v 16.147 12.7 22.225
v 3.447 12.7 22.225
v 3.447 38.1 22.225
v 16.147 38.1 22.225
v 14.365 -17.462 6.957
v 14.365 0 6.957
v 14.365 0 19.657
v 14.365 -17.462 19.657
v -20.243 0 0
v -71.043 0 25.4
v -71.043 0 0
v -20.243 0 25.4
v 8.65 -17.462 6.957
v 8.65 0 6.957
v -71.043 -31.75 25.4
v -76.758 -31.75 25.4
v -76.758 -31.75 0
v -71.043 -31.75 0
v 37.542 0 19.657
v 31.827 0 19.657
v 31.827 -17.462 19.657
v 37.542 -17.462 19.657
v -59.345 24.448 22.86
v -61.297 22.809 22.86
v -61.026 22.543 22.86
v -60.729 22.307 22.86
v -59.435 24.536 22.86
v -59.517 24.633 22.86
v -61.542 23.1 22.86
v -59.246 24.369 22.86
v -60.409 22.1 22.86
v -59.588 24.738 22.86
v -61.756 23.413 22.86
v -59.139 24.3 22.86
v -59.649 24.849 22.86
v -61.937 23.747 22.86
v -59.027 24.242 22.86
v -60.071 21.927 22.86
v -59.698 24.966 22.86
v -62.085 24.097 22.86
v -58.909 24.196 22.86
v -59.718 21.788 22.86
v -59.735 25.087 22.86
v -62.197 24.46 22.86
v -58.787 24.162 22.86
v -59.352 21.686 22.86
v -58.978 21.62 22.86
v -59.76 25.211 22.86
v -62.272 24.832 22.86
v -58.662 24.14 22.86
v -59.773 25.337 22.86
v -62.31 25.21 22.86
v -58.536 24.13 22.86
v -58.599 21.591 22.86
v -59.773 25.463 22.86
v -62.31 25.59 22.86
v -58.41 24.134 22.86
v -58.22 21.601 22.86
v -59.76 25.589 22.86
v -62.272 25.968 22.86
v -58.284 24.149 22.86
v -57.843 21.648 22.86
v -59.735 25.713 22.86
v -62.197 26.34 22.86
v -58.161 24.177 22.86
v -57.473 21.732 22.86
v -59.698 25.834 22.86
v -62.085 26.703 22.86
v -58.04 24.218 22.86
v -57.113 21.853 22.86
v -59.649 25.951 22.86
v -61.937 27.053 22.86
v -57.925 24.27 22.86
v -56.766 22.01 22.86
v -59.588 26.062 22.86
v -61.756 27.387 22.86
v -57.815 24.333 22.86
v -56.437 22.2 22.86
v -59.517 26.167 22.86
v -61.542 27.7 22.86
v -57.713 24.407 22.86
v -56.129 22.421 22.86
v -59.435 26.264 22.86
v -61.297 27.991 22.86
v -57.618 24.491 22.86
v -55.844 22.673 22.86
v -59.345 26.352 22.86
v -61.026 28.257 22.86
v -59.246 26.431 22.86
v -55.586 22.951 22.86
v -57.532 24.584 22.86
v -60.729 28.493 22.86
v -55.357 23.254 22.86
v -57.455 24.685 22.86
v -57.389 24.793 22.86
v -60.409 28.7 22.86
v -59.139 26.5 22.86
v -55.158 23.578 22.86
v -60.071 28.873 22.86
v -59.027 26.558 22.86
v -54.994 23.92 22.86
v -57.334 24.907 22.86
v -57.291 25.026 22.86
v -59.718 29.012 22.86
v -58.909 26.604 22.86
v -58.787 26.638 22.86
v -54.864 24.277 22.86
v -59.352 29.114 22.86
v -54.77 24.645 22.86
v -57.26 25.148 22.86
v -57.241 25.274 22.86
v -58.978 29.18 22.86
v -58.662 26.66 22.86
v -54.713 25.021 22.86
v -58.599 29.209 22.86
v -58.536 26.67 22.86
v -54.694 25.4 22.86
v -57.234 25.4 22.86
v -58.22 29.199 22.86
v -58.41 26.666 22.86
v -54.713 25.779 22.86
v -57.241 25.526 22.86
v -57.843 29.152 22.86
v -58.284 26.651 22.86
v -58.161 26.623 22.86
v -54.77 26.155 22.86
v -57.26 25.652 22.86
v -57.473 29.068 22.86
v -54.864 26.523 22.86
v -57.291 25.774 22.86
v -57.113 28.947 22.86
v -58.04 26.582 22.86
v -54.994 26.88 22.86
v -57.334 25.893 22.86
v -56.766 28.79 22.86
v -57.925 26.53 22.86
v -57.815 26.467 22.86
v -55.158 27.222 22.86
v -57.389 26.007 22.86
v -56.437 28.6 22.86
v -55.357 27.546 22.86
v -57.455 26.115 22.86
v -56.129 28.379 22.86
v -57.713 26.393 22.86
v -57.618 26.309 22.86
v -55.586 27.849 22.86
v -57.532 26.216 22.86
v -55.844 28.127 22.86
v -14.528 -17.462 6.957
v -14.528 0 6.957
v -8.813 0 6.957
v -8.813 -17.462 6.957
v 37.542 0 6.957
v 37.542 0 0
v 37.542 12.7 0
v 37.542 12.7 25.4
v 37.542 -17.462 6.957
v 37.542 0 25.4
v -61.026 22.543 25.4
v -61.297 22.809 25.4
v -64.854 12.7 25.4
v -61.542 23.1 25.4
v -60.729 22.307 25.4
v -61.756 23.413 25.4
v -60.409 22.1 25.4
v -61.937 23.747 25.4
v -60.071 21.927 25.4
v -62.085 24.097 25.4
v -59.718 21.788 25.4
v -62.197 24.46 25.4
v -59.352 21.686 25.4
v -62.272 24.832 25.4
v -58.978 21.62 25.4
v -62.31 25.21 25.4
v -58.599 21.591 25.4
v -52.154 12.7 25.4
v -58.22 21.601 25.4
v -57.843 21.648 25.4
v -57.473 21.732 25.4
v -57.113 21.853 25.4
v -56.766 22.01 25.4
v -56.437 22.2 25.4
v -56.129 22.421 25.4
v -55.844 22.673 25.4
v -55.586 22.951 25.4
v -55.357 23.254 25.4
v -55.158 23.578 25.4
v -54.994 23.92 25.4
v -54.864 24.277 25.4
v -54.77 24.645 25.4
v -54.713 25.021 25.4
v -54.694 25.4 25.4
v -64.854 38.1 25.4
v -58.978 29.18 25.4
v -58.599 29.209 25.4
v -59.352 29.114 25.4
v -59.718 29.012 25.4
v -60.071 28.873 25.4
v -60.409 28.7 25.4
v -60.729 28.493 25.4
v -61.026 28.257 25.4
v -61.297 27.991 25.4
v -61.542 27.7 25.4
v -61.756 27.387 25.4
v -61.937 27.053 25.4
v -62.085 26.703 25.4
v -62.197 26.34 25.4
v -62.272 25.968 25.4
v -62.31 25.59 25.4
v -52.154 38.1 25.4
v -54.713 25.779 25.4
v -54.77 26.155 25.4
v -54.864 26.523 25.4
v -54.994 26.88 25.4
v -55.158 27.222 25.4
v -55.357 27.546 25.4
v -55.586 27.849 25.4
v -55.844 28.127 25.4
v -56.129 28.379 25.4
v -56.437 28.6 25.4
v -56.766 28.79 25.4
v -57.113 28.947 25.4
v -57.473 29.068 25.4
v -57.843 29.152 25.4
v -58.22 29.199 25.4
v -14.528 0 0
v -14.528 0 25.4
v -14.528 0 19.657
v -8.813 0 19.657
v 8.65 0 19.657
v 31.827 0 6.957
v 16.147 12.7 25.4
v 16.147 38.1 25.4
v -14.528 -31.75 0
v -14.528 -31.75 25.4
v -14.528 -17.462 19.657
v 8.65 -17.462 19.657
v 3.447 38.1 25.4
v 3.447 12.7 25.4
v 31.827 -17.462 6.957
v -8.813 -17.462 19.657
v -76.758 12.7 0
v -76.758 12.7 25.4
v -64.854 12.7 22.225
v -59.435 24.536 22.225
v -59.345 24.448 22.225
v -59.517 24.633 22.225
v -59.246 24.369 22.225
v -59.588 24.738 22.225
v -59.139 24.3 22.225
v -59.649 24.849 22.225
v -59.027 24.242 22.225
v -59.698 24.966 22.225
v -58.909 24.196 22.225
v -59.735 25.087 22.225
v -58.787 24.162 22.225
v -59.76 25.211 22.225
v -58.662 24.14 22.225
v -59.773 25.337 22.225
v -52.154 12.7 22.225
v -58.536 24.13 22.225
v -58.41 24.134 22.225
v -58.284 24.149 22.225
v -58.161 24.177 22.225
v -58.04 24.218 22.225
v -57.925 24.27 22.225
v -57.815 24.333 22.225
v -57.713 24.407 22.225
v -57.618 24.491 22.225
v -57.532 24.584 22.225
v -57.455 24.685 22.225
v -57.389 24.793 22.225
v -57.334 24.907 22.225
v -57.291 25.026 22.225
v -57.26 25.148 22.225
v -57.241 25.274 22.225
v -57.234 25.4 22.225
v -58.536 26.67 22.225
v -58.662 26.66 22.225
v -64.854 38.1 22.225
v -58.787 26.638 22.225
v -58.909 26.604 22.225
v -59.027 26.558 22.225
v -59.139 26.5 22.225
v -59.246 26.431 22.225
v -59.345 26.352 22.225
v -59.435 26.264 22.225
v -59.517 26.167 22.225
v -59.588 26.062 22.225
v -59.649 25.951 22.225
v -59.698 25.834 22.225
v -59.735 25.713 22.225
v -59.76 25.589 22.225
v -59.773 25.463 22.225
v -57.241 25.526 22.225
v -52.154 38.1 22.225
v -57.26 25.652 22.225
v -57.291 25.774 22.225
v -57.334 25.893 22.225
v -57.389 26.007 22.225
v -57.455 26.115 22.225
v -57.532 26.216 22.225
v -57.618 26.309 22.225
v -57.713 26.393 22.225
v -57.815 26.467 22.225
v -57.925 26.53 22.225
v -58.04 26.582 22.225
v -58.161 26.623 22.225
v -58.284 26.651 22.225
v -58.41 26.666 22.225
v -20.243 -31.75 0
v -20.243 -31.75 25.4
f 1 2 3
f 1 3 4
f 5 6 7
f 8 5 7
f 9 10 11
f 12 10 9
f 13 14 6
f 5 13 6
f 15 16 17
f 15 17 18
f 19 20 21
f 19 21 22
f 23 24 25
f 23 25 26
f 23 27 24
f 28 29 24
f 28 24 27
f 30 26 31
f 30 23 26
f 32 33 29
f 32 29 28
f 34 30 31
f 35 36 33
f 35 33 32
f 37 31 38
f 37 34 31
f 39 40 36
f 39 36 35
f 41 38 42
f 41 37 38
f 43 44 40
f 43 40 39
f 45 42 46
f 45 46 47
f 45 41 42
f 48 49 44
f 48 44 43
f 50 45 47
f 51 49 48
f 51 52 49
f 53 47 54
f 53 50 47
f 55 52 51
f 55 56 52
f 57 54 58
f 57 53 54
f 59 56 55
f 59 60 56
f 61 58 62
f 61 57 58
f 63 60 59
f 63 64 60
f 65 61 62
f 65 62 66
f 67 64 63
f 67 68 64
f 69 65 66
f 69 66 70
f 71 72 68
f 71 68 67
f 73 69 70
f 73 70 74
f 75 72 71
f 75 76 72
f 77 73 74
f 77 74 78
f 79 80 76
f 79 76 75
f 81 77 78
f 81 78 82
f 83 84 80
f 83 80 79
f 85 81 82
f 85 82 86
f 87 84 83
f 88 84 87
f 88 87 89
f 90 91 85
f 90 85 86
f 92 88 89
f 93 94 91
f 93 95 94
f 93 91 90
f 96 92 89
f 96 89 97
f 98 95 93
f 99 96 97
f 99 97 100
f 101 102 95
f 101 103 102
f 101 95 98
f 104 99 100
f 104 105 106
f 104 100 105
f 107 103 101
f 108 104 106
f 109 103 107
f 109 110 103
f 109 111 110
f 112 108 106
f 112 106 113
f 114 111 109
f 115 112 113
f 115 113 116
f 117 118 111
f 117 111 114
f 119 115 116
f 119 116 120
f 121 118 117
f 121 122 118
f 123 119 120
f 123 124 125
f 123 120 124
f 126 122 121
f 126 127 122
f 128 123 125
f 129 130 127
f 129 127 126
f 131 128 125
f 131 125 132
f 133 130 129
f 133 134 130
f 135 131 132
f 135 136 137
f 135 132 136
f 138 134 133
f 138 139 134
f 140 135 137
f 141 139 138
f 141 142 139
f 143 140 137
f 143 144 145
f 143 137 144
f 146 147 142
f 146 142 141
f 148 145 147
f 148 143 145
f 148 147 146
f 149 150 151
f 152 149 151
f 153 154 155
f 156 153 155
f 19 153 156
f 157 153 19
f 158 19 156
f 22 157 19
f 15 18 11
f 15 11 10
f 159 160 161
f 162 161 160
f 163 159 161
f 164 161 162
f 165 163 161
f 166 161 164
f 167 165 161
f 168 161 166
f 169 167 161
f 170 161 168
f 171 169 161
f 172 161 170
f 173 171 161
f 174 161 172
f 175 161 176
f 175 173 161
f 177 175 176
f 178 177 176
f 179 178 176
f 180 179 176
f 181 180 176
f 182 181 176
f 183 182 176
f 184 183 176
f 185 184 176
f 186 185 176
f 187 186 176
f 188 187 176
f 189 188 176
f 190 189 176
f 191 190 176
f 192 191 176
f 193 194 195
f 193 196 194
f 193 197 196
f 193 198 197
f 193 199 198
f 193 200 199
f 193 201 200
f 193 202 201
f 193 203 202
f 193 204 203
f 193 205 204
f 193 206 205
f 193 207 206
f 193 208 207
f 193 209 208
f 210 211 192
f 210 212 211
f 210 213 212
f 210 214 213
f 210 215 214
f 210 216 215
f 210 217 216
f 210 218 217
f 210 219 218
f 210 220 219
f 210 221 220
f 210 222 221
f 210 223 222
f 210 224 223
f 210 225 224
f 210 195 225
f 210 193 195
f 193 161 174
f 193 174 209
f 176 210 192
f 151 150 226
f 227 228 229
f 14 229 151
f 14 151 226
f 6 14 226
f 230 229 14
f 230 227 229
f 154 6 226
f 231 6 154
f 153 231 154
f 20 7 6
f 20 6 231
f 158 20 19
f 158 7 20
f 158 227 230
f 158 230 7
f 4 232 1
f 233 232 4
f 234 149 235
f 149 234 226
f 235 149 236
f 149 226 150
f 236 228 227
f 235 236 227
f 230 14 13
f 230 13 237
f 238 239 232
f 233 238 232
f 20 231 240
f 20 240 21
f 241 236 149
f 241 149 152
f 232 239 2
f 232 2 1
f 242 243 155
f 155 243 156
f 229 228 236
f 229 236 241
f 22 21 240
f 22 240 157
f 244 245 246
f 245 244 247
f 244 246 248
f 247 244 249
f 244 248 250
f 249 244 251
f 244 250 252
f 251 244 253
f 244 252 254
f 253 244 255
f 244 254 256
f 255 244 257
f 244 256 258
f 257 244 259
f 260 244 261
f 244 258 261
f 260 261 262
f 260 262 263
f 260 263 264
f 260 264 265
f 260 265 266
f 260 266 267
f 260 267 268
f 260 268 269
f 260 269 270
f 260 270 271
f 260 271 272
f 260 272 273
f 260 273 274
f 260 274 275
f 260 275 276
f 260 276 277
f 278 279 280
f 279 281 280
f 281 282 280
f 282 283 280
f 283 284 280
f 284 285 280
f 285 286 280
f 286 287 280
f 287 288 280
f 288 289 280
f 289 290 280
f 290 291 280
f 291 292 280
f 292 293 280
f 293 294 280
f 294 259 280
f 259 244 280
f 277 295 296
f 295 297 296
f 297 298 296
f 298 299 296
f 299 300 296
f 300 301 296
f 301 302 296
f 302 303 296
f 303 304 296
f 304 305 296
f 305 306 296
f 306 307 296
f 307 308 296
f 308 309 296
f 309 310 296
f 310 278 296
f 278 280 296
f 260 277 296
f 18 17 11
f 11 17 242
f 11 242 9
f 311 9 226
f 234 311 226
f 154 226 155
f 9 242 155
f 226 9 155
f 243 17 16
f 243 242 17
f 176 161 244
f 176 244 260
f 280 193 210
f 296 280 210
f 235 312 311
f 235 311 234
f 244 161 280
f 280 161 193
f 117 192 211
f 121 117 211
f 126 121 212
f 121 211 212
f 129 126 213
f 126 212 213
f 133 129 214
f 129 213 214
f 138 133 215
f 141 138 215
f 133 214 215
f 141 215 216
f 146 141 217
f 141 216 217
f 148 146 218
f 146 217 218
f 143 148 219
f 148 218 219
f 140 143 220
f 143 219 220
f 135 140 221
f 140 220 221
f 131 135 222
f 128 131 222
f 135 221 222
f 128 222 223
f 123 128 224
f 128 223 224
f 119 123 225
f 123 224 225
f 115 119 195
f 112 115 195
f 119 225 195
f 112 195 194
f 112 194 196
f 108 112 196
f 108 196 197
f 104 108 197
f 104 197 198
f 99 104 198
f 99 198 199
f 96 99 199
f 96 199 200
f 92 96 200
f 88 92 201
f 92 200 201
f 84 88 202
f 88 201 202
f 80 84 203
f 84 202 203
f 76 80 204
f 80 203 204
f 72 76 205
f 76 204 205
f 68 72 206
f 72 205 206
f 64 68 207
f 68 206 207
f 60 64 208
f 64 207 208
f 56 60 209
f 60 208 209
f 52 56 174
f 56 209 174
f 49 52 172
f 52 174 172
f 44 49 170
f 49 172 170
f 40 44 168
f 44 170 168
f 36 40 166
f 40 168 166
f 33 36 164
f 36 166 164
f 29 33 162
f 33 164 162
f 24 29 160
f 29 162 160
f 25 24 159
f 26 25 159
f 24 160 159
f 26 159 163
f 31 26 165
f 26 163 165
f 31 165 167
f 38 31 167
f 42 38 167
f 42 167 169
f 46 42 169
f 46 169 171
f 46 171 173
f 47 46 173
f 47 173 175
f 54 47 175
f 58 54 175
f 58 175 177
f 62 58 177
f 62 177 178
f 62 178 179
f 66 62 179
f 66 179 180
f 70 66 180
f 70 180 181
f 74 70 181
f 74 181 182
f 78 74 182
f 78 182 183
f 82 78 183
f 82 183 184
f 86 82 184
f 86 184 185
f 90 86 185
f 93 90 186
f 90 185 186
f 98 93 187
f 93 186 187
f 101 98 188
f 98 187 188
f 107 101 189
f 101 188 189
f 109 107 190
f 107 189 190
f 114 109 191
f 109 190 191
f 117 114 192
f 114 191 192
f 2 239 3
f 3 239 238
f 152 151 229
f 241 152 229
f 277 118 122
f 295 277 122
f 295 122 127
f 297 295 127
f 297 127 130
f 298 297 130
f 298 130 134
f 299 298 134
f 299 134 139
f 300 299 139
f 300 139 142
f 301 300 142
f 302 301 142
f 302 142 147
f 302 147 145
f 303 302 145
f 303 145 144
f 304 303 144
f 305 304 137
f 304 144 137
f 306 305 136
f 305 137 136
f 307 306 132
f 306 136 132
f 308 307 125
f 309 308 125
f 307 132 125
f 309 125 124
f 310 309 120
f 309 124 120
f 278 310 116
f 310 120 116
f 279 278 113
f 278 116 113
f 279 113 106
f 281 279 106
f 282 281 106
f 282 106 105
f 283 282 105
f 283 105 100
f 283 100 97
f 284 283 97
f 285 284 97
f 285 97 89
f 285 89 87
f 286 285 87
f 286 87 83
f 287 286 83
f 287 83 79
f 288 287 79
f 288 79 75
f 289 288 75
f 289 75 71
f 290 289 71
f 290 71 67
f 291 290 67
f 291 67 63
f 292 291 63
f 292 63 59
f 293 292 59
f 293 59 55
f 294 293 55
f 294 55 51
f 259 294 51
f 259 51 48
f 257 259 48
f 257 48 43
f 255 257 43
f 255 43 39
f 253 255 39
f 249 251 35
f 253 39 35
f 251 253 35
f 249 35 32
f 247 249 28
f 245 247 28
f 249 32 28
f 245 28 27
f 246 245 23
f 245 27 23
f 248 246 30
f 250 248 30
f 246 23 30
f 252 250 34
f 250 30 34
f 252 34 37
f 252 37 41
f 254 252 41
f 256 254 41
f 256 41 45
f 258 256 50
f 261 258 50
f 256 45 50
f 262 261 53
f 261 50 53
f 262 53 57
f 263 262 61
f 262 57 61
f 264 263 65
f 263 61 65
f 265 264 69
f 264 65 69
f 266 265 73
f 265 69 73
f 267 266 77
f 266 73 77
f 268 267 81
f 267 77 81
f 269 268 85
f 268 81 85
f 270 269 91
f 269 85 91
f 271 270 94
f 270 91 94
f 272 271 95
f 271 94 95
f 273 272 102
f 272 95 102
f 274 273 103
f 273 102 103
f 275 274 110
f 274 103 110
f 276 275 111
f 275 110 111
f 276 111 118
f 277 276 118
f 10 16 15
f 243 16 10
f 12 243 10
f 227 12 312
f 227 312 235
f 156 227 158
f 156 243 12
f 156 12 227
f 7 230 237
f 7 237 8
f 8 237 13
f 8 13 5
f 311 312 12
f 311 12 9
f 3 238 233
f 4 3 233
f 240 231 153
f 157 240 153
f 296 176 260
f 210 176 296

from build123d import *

# Parameters (mm, degrees)
F0_W      = 114.3
F0_H      = 25.4
F1_DEPTH  = 12.7
F2_W      = 5.715
F2_H      = 25.4
F3_DEPTH  = 31.75
F4_W      = 5.715
F4_H      = 12.7
F5_DEPTH  = 17.4625
F6_W      = 12.7
F6_H      = 25.4
F7_DEPTH  = 3.175
F8_R      = 3.81
F9_DEPTH  = 2.54
F10_R     = 1.27
F11_DEPTH = 22.861


with BuildPart() as f1:
    # F0 (on Front) → F1 (new body)
    with BuildSketch(Plane.XZ):
        with Locations((-19.607557, 12.7)):
            Rectangle(F0_W, F0_H)
    extrude(amount=-F1_DEPTH)

    # F2 (on face) → F3 (join)
    with BuildSketch(Plane.XZ):
        with Locations((-73.900057, 12.7)):
            Rectangle(F2_W, F2_H)
        Polygon((-14.527557, 25.4), (-20.242557, 25.4), (-20.242557, 0), (-14.527557, 0), (-14.527557, 6.35), (-14.527557, 19.05), align=None)
    extrude(amount=F3_DEPTH)

    # F4 (on face) → F5 (join)
    with BuildSketch(Plane.XZ):
        with Locations((-11.670057, 13.307034)):
            Rectangle(F4_W, F4_H)
        with Locations((11.507443, 13.307034)):
            Rectangle(F4_W, F4_H)
        with Locations((34.684943, 13.307034)):
            Rectangle(F4_W, F4_H)
    extrude(amount=F5_DEPTH)


with BuildPart() as f7:
    # F6 (on face) → F7 (new body)
    with BuildSketch(Plane.XY.offset(25.4)):
        with Locations((-58.50448, 25.4)):
            Rectangle(F6_W, F6_H)
        with Locations((9.796742, 25.4)):
            Rectangle(F6_W, F6_H)
    extrude(amount=-F7_DEPTH)

    # F8 (on face) → F9 (cut)
    with BuildSketch(Plane.XY.offset(25.4)):
        with Locations((-58.50448, 25.4)):
            Circle(F8_R)
    extrude(amount=-F9_DEPTH, mode=Mode.SUBTRACT)

    # F10 (on face) → F11 (cut, through all)
    with BuildSketch(Plane.XY.offset(22.86)):
        with Locations((-58.50448, 25.4)):
            Circle(F10_R)
    extrude(amount=-F11_DEPTH, mode=Mode.SUBTRACT)


solid = Compound([f1.part, f7.part])
